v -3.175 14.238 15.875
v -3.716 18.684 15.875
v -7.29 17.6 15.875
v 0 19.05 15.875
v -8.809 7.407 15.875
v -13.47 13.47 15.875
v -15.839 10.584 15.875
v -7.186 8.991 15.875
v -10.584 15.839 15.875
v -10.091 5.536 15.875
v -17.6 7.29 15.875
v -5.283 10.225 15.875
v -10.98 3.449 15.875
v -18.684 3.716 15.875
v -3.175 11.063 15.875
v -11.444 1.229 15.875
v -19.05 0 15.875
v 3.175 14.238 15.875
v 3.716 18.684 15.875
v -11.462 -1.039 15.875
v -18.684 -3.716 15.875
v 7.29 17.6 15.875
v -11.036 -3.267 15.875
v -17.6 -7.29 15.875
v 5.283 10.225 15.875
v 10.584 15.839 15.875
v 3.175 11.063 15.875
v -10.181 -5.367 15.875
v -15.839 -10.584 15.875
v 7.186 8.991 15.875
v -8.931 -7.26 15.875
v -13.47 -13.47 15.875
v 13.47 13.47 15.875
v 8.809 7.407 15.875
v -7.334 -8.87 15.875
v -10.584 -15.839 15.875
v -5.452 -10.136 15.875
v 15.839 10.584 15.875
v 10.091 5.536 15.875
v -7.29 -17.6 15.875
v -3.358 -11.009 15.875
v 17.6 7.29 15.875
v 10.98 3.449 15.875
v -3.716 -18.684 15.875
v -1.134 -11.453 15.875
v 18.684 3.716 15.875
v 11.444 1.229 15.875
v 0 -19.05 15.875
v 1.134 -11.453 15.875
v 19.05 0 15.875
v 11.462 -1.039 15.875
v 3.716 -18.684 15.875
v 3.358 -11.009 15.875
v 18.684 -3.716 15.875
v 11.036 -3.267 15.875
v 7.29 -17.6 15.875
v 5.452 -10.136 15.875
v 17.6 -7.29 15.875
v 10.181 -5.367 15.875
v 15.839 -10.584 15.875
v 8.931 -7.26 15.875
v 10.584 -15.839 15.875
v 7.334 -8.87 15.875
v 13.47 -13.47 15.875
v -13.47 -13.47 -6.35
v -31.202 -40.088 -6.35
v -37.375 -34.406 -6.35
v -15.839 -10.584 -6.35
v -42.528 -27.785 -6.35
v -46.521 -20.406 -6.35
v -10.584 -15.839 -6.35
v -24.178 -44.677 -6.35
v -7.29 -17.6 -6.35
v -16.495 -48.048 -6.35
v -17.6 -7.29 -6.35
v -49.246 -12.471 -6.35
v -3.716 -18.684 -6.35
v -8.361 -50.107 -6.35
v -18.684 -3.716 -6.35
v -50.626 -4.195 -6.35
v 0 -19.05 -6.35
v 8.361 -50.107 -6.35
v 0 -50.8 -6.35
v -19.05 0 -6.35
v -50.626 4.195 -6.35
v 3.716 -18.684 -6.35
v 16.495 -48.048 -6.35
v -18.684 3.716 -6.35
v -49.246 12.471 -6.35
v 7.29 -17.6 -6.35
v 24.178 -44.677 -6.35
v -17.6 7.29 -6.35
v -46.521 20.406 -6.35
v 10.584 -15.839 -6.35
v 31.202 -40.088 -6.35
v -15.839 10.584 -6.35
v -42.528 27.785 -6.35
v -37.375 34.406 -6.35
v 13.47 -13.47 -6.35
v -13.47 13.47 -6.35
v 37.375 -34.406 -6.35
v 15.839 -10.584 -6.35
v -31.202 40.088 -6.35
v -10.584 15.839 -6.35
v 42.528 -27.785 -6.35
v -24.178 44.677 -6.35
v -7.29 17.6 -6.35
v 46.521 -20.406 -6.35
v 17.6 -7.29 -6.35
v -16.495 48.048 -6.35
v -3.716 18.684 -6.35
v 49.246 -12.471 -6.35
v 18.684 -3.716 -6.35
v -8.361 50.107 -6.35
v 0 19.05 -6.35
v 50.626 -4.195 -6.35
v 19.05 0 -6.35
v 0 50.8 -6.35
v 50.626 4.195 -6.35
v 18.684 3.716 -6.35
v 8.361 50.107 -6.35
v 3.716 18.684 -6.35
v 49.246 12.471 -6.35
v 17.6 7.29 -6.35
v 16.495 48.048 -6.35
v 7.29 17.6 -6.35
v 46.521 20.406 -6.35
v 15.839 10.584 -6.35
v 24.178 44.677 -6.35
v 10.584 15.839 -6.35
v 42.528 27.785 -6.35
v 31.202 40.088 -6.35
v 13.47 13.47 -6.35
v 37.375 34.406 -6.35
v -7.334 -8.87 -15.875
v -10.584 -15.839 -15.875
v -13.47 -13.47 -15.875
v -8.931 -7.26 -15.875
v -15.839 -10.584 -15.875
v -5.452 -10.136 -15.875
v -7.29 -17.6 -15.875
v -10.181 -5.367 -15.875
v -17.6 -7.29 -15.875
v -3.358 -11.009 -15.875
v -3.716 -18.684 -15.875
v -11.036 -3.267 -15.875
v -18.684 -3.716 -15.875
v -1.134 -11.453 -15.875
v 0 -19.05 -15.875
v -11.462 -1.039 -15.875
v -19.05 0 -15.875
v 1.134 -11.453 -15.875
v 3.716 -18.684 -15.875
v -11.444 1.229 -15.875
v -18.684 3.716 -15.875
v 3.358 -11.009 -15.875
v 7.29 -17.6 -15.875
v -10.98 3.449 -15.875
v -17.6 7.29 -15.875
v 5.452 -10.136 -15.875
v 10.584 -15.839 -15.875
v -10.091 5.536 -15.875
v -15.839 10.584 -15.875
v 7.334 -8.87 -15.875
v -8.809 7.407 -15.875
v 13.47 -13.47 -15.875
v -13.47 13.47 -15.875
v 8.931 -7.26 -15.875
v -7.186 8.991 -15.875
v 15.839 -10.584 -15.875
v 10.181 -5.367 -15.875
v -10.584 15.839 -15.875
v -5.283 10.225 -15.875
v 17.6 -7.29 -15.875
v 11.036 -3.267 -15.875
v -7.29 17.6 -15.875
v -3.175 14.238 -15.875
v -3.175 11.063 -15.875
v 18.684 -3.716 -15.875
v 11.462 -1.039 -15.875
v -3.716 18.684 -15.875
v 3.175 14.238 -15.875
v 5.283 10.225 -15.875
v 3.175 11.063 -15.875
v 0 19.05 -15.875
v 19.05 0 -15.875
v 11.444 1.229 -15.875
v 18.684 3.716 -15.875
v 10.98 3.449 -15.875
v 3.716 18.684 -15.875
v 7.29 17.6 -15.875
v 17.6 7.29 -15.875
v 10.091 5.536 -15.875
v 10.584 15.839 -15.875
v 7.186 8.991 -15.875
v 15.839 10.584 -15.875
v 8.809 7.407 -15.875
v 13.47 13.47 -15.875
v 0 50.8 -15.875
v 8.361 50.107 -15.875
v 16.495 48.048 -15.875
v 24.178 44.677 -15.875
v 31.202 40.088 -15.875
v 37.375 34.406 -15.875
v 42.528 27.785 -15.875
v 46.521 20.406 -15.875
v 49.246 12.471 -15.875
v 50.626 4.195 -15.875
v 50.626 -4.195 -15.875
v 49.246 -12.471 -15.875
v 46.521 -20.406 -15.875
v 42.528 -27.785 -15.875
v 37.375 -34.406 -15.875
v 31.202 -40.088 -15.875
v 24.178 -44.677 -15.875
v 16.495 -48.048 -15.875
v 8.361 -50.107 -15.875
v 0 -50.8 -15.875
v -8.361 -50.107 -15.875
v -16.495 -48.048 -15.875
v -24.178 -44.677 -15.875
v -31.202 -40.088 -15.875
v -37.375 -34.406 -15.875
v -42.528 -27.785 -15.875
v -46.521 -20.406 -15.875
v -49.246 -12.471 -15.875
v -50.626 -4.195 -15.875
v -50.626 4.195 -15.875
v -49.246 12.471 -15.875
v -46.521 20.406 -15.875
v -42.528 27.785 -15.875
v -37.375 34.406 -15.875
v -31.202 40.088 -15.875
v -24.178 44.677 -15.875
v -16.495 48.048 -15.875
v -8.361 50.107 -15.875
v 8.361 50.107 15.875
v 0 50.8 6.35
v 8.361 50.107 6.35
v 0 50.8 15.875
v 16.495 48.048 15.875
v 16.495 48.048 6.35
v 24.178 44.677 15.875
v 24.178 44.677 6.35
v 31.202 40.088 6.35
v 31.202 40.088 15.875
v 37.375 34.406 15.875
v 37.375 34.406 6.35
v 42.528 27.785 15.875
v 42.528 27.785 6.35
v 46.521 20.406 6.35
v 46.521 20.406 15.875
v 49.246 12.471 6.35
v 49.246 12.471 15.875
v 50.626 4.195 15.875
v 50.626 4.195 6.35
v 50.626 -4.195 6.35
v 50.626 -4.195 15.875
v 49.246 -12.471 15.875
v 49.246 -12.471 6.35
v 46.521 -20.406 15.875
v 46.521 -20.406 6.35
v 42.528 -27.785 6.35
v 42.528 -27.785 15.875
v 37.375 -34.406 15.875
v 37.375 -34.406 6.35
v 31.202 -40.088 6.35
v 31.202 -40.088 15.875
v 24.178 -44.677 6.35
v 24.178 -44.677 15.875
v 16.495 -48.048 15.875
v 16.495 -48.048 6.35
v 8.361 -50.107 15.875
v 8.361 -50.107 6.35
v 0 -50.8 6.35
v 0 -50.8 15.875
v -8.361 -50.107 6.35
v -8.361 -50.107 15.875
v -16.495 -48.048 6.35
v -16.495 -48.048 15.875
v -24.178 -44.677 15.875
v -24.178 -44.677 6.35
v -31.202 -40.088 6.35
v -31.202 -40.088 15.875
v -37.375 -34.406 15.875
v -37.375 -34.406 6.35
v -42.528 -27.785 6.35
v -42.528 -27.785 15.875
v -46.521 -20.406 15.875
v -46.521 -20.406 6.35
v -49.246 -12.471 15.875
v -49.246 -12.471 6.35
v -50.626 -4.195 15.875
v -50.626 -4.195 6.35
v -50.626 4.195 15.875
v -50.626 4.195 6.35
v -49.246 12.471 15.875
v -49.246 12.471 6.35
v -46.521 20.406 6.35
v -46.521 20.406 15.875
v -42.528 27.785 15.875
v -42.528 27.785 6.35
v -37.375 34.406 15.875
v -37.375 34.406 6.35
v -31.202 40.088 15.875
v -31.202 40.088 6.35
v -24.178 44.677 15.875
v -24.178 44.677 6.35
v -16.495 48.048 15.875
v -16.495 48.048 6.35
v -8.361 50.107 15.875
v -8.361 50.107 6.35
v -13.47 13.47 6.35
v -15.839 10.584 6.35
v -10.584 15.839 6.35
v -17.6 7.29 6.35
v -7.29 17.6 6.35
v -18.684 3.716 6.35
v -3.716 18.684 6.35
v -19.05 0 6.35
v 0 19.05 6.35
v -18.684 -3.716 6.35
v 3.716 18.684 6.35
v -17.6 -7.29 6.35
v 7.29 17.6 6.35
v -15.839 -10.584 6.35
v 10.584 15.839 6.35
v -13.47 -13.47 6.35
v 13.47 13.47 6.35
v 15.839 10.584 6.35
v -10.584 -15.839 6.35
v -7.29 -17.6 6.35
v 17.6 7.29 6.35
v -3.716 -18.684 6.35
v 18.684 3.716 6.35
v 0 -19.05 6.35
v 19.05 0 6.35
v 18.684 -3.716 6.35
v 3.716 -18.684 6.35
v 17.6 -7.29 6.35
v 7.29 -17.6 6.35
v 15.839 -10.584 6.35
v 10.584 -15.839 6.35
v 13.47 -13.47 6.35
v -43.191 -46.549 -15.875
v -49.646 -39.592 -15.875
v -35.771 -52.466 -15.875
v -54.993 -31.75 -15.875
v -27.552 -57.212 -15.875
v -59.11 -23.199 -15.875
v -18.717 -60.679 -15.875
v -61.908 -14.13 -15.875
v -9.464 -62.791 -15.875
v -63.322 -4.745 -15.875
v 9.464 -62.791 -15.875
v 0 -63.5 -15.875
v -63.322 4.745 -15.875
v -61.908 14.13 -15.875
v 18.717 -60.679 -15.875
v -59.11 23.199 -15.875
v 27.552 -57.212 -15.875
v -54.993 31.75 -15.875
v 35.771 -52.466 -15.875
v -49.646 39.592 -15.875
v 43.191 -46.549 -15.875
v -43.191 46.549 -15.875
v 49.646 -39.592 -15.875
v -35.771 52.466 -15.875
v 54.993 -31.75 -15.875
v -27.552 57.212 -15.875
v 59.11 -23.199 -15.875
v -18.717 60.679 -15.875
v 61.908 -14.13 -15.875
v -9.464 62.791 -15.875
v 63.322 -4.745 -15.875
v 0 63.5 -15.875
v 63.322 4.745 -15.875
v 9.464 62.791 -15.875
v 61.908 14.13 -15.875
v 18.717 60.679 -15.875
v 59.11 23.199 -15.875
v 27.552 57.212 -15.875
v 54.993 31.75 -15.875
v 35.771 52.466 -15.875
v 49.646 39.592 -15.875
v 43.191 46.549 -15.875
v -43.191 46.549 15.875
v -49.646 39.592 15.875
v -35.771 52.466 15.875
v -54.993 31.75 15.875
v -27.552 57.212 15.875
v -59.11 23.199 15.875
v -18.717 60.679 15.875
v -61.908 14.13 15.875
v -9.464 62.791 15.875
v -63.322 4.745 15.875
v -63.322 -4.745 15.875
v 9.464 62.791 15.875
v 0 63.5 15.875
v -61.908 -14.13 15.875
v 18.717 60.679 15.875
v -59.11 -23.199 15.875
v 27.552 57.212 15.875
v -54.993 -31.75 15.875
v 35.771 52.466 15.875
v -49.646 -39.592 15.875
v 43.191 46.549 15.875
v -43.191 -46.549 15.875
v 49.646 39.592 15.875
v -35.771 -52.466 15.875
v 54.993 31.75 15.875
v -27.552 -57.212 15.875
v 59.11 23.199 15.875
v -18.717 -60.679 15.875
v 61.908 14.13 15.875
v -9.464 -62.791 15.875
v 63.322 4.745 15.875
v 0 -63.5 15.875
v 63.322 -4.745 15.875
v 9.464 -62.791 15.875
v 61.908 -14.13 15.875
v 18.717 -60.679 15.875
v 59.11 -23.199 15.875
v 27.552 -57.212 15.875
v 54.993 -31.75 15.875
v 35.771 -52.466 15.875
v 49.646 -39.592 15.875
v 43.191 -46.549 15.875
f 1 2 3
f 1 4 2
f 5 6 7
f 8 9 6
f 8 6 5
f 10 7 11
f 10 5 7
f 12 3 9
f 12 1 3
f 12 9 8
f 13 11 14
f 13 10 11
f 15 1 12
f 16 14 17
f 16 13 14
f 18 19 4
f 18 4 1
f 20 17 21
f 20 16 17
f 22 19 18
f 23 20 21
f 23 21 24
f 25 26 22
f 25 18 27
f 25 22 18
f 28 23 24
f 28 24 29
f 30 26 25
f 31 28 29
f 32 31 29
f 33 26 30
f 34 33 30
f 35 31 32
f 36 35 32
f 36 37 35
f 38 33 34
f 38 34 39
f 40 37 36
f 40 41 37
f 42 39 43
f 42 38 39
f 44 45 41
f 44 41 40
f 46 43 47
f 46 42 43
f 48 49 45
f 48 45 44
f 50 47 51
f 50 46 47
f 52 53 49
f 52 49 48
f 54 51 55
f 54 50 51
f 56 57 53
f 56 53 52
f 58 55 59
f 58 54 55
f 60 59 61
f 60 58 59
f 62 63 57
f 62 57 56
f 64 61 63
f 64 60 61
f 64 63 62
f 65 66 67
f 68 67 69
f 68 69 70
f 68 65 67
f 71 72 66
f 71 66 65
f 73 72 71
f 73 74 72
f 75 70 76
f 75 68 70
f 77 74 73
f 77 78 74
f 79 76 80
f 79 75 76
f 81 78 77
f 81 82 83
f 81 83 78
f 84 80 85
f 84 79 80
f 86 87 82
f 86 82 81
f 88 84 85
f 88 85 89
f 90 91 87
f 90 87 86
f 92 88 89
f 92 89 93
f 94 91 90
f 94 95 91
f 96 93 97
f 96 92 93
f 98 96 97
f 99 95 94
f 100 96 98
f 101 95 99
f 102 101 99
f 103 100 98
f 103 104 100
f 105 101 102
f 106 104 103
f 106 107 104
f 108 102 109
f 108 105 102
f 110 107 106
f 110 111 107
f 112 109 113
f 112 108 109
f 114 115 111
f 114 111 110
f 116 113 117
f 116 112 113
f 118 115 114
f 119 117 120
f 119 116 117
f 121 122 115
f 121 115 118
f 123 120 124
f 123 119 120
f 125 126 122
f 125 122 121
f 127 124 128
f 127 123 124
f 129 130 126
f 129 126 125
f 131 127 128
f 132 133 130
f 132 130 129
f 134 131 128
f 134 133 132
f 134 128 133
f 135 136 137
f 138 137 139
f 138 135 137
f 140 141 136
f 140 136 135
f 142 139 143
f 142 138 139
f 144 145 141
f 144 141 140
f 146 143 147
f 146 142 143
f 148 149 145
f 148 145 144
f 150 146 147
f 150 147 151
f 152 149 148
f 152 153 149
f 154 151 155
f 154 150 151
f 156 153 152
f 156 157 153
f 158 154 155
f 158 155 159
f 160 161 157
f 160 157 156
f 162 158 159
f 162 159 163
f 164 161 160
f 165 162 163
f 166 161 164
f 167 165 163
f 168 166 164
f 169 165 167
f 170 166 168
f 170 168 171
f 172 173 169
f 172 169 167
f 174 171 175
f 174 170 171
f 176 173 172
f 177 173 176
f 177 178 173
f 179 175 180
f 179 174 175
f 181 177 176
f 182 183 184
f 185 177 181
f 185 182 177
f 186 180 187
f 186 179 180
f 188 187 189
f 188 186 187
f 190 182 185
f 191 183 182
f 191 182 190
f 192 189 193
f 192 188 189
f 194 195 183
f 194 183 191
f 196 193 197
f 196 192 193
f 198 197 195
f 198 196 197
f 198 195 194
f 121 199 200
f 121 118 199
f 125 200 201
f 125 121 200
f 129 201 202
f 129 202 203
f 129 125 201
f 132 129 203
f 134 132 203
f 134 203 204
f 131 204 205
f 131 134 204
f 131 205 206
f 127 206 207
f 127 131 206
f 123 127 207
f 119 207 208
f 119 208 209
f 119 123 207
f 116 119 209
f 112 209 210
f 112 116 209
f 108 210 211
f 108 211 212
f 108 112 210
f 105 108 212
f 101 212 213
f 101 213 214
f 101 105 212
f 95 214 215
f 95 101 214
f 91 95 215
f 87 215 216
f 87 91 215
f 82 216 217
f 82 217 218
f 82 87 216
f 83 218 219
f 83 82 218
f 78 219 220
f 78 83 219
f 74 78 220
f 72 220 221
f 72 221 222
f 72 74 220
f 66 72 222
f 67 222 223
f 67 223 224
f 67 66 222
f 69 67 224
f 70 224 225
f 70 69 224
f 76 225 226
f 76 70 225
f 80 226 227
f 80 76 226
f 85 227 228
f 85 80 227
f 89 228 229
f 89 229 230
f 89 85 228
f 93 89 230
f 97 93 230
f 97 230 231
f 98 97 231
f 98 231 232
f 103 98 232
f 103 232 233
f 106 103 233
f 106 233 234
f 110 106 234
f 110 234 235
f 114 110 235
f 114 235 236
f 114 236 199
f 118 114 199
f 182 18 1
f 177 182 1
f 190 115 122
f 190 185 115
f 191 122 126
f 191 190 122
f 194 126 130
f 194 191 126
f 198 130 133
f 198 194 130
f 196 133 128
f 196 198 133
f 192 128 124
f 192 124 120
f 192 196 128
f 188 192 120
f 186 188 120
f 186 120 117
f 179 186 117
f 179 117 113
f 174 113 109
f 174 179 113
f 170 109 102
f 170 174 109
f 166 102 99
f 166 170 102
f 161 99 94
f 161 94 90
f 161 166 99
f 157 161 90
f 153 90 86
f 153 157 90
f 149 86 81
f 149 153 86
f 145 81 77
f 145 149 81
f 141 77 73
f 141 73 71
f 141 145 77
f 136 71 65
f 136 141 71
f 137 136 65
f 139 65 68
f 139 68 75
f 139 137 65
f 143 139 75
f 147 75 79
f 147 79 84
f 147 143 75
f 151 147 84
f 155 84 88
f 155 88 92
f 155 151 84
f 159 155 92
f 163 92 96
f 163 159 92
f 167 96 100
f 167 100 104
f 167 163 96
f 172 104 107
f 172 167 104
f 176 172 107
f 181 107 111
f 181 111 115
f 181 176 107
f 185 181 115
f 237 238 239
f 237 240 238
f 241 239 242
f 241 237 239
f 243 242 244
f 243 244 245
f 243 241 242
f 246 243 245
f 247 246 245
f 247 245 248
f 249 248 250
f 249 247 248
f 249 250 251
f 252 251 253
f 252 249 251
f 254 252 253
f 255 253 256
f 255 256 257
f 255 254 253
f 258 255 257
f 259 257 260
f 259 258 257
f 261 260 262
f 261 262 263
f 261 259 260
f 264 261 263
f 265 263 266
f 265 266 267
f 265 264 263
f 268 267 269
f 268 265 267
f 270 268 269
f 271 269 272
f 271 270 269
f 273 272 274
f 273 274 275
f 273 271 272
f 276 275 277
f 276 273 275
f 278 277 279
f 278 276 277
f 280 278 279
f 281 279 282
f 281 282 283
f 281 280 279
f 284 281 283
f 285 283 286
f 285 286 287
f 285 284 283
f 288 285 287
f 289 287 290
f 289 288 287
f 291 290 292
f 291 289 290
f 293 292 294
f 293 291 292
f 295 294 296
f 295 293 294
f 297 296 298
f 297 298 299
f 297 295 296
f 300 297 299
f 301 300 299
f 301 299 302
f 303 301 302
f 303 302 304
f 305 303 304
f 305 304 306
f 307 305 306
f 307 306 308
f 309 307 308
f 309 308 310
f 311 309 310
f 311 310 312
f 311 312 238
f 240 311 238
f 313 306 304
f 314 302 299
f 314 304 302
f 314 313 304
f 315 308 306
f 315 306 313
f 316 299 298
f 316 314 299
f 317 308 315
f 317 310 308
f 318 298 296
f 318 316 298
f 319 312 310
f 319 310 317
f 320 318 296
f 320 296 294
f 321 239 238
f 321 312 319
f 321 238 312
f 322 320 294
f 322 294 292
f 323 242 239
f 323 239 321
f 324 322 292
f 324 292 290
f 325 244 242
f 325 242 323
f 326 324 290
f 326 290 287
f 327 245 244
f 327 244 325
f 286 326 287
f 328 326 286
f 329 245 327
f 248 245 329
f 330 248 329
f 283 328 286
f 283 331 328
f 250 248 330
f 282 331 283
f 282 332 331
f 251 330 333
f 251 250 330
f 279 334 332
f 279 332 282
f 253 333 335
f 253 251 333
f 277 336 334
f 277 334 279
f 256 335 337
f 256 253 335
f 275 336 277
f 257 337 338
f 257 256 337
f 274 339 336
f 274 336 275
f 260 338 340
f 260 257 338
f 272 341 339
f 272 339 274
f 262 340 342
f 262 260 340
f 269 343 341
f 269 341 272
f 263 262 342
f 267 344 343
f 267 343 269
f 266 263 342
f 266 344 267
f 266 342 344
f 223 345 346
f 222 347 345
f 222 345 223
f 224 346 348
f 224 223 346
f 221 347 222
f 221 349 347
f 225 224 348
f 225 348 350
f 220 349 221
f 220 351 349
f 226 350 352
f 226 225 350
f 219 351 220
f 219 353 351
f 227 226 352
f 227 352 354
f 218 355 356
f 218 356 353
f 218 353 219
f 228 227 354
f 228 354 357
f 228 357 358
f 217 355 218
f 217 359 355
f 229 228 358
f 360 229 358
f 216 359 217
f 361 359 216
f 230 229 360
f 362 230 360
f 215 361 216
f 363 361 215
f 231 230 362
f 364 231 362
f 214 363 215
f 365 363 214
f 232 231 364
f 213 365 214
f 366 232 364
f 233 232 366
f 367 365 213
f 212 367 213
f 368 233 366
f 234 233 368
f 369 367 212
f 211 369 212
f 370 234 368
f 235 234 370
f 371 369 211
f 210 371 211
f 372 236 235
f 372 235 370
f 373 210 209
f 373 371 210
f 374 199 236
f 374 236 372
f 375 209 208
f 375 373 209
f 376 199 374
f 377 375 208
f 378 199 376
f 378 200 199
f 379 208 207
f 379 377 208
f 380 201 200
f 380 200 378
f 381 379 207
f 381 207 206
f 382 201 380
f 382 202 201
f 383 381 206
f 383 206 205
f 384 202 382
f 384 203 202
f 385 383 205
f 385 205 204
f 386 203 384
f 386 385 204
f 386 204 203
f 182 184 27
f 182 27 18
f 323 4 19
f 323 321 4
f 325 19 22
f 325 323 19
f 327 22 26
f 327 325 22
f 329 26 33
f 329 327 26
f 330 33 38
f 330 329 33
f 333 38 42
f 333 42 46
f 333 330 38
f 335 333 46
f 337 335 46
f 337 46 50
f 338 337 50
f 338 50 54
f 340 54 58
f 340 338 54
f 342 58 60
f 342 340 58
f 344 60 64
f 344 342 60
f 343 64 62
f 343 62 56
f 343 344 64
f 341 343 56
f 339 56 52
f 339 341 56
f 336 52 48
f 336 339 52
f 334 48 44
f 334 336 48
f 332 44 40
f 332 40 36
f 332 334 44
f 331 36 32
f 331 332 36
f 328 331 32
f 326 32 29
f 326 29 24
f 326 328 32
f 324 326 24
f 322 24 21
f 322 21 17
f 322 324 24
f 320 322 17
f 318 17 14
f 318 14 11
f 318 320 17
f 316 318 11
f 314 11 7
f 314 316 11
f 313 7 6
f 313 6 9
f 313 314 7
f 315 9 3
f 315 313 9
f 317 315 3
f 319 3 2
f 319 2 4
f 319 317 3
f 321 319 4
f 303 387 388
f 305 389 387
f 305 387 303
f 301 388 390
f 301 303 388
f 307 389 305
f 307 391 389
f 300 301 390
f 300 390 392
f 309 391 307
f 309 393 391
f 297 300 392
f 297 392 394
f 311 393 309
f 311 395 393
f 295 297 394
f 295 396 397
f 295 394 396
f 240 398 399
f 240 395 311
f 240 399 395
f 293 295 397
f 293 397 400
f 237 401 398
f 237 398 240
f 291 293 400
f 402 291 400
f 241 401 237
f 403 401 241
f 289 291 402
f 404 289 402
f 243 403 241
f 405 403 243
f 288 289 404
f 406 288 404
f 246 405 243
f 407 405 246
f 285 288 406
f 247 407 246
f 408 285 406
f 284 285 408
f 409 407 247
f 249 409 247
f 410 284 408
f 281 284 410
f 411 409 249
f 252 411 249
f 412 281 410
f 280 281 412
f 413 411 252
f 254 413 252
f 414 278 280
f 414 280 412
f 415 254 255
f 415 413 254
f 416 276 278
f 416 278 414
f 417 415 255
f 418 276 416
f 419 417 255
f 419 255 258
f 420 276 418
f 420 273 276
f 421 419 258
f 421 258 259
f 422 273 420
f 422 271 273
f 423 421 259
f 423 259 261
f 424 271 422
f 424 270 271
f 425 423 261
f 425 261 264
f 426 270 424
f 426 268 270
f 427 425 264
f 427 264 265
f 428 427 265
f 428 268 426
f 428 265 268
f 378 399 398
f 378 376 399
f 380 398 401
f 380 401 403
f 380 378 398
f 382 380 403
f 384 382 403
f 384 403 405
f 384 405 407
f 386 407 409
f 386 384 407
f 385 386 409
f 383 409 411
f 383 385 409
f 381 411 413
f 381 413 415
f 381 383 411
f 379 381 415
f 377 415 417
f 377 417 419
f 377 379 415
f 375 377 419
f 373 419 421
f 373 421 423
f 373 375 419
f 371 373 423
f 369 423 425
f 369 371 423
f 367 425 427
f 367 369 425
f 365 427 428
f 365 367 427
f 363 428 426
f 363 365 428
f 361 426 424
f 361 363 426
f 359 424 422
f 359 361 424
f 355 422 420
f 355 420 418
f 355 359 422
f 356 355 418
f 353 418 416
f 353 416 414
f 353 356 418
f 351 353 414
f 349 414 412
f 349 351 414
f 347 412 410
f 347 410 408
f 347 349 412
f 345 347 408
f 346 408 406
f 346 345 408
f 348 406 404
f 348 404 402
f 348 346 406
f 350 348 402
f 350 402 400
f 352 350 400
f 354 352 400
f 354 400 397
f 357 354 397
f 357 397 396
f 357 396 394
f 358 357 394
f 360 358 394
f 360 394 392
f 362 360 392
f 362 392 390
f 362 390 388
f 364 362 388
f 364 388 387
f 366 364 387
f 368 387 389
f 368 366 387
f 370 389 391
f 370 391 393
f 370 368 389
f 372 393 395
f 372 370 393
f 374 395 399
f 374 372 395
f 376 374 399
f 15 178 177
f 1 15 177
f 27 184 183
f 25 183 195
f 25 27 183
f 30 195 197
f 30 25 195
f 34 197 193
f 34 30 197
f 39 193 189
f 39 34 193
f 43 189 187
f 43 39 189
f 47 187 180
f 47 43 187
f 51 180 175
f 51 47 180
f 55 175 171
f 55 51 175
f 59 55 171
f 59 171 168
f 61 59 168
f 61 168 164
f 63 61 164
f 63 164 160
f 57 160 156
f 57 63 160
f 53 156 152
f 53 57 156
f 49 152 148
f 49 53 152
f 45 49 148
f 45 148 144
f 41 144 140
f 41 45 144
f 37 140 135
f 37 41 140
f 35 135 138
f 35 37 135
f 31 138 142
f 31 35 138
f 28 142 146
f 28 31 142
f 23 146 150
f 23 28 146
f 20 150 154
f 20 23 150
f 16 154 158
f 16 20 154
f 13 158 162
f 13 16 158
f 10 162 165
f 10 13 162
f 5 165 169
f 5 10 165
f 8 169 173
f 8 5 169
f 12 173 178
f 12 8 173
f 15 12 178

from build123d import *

# Parameters (mm, degrees)
SKETCH4_W          = 6.35
SKETCH4_H          = 3.175
CUT_EXTRUDE1_DEPTH = 32.75


with BuildPart() as part:
    # Sketch1 → Revolve1 (revolve)
    with BuildSketch(Plane(origin=(0, 0, 0), x_dir=(0, 0, -1), z_dir=(1, 0, 0))):
        Polygon((15.875, 11.509375), (-15.875, 11.509375), (-15.875, 19.05), (-6.35, 19.05), (-6.35, 50.8), (-15.875, 50.8), (-15.875, 63.5), (15.875, 63.5), (15.875, 50.8), (6.35, 50.8), (6.35, 19.05), (15.875, 19.05), align=None)
    revolve(axis=Axis((0, 0, 34.214514903), (0, 0, -1)))

    # Sketch4 → Cut-Extrude1 (cut, through all)
    with BuildSketch(Plane(origin=(0, 0, -15.875), x_dir=(-1, 0, 0), z_dir=(0, 0, -1))):
        with Locations((0, 12.650279393)):
            Rectangle(SKETCH4_W, SKETCH4_H)
    extrude(amount=-CUT_EXTRUDE1_DEPTH, mode=Mode.SUBTRACT)


solid = part.part
